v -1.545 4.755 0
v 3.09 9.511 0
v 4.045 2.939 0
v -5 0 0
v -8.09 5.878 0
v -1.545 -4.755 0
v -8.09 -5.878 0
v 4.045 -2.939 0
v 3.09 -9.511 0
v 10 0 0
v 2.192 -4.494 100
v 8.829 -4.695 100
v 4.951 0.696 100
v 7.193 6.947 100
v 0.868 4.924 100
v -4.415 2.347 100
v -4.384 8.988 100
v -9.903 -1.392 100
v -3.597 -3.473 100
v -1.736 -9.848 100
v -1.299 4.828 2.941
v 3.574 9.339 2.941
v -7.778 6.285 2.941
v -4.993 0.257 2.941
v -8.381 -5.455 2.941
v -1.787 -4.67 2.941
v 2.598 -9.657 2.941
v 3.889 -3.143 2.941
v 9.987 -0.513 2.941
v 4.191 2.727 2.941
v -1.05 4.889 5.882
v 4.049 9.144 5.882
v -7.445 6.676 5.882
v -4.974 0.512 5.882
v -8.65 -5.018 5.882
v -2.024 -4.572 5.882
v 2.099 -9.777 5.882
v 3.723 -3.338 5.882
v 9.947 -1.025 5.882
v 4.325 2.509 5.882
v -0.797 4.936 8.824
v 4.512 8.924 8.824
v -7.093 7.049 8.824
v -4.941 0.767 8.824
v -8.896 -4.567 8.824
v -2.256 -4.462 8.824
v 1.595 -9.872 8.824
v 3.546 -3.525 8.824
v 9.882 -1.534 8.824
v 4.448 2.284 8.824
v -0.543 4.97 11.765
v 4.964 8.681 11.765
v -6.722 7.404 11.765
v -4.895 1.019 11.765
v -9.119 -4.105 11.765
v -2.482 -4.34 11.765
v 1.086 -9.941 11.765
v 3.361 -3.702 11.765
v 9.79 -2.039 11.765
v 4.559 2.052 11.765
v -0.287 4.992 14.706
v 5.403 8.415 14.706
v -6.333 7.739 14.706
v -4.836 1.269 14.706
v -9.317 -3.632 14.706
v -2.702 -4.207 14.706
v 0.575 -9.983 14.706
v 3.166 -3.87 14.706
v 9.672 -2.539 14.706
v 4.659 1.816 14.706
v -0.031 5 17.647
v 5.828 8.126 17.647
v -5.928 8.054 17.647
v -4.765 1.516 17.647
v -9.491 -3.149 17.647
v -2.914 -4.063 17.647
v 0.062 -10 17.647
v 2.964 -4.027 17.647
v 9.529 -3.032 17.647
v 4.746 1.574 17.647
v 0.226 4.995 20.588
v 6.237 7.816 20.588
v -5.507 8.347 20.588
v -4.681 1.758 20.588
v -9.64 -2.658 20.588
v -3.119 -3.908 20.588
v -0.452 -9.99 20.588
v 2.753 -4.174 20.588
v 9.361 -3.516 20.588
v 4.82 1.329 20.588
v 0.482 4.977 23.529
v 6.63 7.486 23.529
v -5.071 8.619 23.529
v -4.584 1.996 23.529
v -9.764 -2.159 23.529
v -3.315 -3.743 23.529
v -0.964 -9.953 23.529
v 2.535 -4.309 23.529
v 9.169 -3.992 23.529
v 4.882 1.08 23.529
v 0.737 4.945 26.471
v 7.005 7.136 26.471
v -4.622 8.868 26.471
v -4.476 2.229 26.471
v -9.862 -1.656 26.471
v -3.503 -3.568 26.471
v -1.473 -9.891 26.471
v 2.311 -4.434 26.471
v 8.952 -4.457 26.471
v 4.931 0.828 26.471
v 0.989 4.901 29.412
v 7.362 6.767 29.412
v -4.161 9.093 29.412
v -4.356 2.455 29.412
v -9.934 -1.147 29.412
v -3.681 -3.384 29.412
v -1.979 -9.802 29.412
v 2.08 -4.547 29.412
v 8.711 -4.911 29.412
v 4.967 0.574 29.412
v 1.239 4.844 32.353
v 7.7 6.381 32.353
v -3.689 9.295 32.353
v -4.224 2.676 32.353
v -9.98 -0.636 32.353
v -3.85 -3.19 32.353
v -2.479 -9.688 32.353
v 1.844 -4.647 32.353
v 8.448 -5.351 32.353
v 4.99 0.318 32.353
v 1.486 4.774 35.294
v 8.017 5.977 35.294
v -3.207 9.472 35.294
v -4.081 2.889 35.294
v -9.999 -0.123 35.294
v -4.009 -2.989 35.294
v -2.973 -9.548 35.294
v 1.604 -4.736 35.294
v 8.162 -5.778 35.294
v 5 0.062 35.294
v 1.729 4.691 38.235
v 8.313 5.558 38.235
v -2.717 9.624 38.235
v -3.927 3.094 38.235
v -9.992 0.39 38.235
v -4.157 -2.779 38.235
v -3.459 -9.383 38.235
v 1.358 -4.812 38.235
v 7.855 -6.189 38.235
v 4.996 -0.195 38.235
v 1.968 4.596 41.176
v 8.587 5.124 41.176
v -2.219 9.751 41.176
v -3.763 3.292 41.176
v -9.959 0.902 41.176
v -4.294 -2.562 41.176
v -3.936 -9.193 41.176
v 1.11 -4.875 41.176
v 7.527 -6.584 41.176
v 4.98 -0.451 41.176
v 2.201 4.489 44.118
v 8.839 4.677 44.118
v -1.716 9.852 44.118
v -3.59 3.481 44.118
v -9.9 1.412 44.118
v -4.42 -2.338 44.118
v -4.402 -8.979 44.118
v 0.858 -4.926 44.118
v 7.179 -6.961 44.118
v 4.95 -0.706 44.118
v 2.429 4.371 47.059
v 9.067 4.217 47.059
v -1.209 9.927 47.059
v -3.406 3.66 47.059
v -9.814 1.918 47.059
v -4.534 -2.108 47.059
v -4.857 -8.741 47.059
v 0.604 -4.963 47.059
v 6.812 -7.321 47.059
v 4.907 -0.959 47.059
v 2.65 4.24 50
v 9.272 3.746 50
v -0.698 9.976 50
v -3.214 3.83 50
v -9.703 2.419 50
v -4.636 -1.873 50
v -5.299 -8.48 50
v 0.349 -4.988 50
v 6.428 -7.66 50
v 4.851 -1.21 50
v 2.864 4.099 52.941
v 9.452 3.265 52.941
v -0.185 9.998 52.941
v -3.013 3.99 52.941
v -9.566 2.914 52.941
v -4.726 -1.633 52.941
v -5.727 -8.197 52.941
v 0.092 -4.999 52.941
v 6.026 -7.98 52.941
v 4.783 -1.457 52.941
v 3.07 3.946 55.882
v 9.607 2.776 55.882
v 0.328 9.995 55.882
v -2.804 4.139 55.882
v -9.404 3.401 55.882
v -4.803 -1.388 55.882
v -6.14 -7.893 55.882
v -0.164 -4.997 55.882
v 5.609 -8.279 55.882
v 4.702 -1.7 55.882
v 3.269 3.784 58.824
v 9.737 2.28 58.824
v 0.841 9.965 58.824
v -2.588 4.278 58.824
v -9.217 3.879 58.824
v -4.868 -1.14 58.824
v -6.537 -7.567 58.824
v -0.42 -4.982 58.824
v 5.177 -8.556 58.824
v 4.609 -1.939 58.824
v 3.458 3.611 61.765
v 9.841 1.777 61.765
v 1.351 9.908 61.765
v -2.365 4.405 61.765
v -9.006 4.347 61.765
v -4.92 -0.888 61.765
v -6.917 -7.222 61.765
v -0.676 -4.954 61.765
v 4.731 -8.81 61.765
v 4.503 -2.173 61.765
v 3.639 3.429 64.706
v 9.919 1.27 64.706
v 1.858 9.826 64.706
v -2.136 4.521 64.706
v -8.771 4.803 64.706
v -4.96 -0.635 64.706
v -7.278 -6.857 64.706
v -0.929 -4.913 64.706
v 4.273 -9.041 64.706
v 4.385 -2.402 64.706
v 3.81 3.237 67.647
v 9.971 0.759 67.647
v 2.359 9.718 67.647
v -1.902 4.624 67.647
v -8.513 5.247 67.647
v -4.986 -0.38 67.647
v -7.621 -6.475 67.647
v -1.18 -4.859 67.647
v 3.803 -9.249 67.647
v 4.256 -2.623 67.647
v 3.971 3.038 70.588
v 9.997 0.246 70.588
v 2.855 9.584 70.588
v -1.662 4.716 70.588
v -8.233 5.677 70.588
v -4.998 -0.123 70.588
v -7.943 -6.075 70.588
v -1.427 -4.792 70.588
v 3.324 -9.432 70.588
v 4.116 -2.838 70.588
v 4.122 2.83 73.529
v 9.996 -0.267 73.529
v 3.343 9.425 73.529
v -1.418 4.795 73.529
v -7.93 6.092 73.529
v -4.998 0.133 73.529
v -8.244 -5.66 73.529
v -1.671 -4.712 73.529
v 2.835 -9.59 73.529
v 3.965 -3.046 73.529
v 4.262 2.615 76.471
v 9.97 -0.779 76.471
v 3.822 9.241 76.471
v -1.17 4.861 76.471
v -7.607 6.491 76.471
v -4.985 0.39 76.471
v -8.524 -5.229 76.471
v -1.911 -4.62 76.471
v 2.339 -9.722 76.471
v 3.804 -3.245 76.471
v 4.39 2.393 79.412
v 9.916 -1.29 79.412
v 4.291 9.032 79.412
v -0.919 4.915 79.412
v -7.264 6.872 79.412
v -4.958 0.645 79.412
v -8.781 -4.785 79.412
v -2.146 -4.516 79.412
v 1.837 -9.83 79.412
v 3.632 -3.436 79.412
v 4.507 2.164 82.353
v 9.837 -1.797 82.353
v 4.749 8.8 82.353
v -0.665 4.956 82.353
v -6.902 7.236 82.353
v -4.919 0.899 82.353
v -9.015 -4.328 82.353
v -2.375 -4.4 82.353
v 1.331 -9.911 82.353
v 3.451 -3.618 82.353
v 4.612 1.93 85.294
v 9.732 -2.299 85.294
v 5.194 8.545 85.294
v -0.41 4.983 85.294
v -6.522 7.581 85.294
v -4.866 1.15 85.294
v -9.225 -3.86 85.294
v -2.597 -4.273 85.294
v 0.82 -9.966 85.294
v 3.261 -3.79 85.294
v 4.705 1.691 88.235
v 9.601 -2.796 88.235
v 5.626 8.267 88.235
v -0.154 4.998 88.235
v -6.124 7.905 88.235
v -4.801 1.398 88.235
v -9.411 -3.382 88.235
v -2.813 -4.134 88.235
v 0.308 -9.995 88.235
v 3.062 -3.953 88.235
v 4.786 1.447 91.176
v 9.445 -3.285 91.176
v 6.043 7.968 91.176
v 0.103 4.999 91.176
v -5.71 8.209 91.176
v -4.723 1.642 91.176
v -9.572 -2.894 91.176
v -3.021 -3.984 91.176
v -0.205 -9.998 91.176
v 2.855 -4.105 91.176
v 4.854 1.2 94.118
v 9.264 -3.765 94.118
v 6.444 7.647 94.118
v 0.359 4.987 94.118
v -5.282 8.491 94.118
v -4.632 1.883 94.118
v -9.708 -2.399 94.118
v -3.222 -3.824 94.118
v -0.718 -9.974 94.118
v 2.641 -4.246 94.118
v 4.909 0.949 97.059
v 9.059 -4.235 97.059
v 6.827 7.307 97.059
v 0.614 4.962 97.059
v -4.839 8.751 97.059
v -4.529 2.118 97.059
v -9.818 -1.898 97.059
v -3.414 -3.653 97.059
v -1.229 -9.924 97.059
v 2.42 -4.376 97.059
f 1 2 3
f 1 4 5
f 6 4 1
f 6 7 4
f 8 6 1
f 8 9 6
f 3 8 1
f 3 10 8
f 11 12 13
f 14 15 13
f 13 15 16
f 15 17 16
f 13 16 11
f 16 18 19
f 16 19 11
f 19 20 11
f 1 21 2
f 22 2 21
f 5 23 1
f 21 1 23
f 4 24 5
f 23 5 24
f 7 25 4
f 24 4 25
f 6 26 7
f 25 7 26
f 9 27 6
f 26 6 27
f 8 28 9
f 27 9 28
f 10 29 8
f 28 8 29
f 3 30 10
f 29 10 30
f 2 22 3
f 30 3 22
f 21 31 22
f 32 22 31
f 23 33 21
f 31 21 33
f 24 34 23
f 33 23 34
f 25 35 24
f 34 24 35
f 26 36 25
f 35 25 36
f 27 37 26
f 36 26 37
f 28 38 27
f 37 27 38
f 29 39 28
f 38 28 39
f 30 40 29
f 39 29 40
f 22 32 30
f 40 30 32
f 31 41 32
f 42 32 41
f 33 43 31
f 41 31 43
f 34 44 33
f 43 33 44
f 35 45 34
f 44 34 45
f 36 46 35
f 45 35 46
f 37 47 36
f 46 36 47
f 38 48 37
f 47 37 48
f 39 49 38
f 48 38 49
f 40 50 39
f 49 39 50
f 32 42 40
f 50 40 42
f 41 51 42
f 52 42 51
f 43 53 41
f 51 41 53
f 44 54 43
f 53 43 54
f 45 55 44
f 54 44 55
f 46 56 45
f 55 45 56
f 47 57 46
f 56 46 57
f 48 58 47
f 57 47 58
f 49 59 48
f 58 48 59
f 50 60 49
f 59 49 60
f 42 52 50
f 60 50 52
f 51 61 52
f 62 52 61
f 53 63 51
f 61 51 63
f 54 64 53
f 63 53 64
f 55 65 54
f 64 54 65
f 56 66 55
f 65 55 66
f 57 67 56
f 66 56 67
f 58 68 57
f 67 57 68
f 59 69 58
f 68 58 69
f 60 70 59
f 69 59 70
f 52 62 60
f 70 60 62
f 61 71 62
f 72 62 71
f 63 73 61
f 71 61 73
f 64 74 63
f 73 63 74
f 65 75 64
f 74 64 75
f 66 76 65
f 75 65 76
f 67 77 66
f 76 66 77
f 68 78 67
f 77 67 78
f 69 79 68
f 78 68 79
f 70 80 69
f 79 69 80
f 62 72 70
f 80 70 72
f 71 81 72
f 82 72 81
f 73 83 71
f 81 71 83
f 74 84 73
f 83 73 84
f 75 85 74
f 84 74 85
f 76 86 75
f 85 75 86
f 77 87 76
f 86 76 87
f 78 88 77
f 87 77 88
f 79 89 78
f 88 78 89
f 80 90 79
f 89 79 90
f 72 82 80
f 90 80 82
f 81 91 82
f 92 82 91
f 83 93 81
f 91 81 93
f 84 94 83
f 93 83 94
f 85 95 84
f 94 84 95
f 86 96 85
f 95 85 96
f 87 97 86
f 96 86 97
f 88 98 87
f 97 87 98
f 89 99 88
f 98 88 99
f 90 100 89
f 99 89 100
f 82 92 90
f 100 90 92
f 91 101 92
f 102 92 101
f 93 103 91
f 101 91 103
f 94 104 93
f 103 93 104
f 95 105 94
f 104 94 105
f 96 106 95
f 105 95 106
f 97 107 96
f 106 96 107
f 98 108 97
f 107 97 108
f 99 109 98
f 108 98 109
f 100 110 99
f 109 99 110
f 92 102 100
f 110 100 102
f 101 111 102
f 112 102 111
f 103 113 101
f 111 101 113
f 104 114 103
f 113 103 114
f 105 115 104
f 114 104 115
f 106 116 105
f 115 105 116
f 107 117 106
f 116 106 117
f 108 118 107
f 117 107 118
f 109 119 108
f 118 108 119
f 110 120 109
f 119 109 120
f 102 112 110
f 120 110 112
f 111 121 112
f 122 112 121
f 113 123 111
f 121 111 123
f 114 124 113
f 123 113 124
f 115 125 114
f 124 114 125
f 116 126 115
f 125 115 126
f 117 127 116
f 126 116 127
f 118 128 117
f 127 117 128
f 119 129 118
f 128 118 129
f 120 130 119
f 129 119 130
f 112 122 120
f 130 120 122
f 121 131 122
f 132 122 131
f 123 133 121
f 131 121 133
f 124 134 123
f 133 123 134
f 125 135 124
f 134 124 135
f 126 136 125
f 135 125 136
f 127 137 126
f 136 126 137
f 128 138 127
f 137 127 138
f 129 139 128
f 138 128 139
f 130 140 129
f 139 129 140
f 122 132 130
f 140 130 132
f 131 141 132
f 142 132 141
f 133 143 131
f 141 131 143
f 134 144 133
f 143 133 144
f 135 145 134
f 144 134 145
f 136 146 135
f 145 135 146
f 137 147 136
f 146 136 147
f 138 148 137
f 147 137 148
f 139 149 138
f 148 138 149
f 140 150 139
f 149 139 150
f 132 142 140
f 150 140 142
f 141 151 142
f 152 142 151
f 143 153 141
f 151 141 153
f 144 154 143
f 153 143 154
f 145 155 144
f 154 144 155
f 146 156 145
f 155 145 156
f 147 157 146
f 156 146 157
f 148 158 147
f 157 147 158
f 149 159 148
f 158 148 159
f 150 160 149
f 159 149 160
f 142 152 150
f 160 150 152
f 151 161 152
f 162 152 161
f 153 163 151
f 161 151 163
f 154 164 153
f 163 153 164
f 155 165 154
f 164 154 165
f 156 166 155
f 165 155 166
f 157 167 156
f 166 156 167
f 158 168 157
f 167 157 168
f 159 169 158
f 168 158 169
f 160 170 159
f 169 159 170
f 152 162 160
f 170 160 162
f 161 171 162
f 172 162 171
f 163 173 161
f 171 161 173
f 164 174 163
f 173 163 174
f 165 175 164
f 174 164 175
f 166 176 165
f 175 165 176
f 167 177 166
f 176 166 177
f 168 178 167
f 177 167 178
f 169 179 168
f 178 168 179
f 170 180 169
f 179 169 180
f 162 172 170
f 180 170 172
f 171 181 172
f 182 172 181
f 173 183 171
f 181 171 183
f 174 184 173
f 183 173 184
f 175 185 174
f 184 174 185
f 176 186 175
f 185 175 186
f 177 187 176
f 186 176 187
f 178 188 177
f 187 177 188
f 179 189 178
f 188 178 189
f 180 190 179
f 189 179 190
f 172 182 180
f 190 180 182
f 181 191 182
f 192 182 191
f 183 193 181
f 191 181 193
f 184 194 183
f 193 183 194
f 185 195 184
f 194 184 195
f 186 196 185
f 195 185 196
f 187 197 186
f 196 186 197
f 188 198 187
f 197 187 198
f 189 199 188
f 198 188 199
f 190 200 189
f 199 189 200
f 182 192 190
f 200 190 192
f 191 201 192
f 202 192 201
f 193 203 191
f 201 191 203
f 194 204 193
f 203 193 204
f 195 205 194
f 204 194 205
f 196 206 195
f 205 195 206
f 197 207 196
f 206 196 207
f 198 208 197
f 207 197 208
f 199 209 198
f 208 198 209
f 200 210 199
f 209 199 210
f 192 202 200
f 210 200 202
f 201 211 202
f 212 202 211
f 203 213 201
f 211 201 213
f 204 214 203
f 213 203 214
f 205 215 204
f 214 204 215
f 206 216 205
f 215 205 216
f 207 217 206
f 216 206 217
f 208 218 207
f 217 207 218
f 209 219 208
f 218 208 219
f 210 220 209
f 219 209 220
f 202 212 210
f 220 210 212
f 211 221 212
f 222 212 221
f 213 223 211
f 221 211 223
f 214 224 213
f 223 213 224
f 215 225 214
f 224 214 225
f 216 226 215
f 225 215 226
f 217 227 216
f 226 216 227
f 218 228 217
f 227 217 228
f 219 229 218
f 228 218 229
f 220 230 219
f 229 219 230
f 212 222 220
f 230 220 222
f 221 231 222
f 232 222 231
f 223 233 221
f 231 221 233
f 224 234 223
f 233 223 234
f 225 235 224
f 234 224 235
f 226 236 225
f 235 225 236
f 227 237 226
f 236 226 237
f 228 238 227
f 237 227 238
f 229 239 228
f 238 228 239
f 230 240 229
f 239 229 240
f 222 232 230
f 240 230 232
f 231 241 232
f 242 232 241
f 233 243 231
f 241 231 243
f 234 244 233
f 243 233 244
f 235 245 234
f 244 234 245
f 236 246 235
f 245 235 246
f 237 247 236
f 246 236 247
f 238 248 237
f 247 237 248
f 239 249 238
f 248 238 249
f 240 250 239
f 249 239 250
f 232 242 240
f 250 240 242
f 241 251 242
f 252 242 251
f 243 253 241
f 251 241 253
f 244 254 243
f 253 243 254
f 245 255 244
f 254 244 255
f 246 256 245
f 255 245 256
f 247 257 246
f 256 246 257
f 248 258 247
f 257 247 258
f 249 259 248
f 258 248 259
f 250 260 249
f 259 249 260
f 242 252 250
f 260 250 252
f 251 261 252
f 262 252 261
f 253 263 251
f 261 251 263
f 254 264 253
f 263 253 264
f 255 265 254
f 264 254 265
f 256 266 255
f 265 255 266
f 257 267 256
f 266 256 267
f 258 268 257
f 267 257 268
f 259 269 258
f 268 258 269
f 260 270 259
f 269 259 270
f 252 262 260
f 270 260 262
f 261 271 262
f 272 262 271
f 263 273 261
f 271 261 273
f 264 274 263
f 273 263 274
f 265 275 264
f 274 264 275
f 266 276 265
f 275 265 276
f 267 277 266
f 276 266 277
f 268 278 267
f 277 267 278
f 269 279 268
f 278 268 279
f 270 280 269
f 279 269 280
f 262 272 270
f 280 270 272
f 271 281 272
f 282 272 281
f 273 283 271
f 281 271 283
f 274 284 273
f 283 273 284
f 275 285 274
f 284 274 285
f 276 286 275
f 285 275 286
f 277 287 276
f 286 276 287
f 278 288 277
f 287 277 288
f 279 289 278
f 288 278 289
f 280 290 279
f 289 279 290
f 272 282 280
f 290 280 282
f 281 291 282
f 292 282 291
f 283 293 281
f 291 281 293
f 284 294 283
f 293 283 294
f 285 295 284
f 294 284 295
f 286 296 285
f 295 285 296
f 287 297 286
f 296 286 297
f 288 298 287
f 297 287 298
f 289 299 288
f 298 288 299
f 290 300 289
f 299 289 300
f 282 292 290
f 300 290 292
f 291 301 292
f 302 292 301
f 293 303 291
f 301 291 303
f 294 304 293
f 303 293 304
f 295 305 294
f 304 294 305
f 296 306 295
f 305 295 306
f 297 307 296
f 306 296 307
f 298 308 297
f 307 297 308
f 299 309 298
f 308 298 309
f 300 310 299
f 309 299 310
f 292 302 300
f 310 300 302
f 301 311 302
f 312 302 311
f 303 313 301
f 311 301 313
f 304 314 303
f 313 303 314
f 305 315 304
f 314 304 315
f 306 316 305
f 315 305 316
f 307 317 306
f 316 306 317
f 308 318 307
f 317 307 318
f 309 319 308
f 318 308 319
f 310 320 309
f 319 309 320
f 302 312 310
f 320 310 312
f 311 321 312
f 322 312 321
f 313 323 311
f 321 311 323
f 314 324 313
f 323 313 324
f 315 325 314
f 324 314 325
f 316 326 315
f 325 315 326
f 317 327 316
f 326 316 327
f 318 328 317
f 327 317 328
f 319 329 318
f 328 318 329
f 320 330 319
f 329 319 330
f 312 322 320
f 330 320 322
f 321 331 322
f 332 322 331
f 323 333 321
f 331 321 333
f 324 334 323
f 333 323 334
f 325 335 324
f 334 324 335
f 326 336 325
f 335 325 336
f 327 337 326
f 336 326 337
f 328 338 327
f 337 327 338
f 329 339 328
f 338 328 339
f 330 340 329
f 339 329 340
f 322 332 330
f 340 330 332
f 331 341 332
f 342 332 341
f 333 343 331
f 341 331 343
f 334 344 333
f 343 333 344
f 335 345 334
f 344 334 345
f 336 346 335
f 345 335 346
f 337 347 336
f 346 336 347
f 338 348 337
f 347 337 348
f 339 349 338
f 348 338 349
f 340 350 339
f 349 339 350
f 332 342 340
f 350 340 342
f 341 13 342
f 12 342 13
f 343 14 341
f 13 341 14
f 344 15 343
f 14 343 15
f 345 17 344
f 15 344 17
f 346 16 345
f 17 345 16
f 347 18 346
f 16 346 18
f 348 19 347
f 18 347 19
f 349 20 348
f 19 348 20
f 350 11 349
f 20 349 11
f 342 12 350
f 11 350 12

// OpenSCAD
linear_extrude(100, twist=100, $fn=120) Star(5,10,5);

// points = number of points (minimum 3)
// outer  = radius to outer points
// inner  = radius to inner points
module Star(points, outer, inner) {
	
	// polar to cartesian: radius/angle to x/y
	function x(r, a) = r * cos(a);
	function y(r, a) = r * sin(a);
	
	// angular width of each pie slice of the star
	increment = 360/points;
	
	union() {
		for (p = [0 : points-1]) {
			
			// outer is outer point p
			// inner is inner point following p
			// next is next outer point following p

			assign(	x_outer = x(outer, increment * p),
					y_outer = y(outer, increment * p),
					x_inner = x(inner, (increment * p) + (increment/2)),
					y_inner = y(inner, (increment * p) + (increment/2)),
					x_next  = x(outer, increment * (p+1)),
					y_next  = y(outer, increment * (p+1))) {
				polygon(points = [[x_outer, y_outer], [x_inner, y_inner], [x_next, y_next], [0, 0]], paths  = [[0, 1, 2, 3]]);
			}
		}
	}
}
